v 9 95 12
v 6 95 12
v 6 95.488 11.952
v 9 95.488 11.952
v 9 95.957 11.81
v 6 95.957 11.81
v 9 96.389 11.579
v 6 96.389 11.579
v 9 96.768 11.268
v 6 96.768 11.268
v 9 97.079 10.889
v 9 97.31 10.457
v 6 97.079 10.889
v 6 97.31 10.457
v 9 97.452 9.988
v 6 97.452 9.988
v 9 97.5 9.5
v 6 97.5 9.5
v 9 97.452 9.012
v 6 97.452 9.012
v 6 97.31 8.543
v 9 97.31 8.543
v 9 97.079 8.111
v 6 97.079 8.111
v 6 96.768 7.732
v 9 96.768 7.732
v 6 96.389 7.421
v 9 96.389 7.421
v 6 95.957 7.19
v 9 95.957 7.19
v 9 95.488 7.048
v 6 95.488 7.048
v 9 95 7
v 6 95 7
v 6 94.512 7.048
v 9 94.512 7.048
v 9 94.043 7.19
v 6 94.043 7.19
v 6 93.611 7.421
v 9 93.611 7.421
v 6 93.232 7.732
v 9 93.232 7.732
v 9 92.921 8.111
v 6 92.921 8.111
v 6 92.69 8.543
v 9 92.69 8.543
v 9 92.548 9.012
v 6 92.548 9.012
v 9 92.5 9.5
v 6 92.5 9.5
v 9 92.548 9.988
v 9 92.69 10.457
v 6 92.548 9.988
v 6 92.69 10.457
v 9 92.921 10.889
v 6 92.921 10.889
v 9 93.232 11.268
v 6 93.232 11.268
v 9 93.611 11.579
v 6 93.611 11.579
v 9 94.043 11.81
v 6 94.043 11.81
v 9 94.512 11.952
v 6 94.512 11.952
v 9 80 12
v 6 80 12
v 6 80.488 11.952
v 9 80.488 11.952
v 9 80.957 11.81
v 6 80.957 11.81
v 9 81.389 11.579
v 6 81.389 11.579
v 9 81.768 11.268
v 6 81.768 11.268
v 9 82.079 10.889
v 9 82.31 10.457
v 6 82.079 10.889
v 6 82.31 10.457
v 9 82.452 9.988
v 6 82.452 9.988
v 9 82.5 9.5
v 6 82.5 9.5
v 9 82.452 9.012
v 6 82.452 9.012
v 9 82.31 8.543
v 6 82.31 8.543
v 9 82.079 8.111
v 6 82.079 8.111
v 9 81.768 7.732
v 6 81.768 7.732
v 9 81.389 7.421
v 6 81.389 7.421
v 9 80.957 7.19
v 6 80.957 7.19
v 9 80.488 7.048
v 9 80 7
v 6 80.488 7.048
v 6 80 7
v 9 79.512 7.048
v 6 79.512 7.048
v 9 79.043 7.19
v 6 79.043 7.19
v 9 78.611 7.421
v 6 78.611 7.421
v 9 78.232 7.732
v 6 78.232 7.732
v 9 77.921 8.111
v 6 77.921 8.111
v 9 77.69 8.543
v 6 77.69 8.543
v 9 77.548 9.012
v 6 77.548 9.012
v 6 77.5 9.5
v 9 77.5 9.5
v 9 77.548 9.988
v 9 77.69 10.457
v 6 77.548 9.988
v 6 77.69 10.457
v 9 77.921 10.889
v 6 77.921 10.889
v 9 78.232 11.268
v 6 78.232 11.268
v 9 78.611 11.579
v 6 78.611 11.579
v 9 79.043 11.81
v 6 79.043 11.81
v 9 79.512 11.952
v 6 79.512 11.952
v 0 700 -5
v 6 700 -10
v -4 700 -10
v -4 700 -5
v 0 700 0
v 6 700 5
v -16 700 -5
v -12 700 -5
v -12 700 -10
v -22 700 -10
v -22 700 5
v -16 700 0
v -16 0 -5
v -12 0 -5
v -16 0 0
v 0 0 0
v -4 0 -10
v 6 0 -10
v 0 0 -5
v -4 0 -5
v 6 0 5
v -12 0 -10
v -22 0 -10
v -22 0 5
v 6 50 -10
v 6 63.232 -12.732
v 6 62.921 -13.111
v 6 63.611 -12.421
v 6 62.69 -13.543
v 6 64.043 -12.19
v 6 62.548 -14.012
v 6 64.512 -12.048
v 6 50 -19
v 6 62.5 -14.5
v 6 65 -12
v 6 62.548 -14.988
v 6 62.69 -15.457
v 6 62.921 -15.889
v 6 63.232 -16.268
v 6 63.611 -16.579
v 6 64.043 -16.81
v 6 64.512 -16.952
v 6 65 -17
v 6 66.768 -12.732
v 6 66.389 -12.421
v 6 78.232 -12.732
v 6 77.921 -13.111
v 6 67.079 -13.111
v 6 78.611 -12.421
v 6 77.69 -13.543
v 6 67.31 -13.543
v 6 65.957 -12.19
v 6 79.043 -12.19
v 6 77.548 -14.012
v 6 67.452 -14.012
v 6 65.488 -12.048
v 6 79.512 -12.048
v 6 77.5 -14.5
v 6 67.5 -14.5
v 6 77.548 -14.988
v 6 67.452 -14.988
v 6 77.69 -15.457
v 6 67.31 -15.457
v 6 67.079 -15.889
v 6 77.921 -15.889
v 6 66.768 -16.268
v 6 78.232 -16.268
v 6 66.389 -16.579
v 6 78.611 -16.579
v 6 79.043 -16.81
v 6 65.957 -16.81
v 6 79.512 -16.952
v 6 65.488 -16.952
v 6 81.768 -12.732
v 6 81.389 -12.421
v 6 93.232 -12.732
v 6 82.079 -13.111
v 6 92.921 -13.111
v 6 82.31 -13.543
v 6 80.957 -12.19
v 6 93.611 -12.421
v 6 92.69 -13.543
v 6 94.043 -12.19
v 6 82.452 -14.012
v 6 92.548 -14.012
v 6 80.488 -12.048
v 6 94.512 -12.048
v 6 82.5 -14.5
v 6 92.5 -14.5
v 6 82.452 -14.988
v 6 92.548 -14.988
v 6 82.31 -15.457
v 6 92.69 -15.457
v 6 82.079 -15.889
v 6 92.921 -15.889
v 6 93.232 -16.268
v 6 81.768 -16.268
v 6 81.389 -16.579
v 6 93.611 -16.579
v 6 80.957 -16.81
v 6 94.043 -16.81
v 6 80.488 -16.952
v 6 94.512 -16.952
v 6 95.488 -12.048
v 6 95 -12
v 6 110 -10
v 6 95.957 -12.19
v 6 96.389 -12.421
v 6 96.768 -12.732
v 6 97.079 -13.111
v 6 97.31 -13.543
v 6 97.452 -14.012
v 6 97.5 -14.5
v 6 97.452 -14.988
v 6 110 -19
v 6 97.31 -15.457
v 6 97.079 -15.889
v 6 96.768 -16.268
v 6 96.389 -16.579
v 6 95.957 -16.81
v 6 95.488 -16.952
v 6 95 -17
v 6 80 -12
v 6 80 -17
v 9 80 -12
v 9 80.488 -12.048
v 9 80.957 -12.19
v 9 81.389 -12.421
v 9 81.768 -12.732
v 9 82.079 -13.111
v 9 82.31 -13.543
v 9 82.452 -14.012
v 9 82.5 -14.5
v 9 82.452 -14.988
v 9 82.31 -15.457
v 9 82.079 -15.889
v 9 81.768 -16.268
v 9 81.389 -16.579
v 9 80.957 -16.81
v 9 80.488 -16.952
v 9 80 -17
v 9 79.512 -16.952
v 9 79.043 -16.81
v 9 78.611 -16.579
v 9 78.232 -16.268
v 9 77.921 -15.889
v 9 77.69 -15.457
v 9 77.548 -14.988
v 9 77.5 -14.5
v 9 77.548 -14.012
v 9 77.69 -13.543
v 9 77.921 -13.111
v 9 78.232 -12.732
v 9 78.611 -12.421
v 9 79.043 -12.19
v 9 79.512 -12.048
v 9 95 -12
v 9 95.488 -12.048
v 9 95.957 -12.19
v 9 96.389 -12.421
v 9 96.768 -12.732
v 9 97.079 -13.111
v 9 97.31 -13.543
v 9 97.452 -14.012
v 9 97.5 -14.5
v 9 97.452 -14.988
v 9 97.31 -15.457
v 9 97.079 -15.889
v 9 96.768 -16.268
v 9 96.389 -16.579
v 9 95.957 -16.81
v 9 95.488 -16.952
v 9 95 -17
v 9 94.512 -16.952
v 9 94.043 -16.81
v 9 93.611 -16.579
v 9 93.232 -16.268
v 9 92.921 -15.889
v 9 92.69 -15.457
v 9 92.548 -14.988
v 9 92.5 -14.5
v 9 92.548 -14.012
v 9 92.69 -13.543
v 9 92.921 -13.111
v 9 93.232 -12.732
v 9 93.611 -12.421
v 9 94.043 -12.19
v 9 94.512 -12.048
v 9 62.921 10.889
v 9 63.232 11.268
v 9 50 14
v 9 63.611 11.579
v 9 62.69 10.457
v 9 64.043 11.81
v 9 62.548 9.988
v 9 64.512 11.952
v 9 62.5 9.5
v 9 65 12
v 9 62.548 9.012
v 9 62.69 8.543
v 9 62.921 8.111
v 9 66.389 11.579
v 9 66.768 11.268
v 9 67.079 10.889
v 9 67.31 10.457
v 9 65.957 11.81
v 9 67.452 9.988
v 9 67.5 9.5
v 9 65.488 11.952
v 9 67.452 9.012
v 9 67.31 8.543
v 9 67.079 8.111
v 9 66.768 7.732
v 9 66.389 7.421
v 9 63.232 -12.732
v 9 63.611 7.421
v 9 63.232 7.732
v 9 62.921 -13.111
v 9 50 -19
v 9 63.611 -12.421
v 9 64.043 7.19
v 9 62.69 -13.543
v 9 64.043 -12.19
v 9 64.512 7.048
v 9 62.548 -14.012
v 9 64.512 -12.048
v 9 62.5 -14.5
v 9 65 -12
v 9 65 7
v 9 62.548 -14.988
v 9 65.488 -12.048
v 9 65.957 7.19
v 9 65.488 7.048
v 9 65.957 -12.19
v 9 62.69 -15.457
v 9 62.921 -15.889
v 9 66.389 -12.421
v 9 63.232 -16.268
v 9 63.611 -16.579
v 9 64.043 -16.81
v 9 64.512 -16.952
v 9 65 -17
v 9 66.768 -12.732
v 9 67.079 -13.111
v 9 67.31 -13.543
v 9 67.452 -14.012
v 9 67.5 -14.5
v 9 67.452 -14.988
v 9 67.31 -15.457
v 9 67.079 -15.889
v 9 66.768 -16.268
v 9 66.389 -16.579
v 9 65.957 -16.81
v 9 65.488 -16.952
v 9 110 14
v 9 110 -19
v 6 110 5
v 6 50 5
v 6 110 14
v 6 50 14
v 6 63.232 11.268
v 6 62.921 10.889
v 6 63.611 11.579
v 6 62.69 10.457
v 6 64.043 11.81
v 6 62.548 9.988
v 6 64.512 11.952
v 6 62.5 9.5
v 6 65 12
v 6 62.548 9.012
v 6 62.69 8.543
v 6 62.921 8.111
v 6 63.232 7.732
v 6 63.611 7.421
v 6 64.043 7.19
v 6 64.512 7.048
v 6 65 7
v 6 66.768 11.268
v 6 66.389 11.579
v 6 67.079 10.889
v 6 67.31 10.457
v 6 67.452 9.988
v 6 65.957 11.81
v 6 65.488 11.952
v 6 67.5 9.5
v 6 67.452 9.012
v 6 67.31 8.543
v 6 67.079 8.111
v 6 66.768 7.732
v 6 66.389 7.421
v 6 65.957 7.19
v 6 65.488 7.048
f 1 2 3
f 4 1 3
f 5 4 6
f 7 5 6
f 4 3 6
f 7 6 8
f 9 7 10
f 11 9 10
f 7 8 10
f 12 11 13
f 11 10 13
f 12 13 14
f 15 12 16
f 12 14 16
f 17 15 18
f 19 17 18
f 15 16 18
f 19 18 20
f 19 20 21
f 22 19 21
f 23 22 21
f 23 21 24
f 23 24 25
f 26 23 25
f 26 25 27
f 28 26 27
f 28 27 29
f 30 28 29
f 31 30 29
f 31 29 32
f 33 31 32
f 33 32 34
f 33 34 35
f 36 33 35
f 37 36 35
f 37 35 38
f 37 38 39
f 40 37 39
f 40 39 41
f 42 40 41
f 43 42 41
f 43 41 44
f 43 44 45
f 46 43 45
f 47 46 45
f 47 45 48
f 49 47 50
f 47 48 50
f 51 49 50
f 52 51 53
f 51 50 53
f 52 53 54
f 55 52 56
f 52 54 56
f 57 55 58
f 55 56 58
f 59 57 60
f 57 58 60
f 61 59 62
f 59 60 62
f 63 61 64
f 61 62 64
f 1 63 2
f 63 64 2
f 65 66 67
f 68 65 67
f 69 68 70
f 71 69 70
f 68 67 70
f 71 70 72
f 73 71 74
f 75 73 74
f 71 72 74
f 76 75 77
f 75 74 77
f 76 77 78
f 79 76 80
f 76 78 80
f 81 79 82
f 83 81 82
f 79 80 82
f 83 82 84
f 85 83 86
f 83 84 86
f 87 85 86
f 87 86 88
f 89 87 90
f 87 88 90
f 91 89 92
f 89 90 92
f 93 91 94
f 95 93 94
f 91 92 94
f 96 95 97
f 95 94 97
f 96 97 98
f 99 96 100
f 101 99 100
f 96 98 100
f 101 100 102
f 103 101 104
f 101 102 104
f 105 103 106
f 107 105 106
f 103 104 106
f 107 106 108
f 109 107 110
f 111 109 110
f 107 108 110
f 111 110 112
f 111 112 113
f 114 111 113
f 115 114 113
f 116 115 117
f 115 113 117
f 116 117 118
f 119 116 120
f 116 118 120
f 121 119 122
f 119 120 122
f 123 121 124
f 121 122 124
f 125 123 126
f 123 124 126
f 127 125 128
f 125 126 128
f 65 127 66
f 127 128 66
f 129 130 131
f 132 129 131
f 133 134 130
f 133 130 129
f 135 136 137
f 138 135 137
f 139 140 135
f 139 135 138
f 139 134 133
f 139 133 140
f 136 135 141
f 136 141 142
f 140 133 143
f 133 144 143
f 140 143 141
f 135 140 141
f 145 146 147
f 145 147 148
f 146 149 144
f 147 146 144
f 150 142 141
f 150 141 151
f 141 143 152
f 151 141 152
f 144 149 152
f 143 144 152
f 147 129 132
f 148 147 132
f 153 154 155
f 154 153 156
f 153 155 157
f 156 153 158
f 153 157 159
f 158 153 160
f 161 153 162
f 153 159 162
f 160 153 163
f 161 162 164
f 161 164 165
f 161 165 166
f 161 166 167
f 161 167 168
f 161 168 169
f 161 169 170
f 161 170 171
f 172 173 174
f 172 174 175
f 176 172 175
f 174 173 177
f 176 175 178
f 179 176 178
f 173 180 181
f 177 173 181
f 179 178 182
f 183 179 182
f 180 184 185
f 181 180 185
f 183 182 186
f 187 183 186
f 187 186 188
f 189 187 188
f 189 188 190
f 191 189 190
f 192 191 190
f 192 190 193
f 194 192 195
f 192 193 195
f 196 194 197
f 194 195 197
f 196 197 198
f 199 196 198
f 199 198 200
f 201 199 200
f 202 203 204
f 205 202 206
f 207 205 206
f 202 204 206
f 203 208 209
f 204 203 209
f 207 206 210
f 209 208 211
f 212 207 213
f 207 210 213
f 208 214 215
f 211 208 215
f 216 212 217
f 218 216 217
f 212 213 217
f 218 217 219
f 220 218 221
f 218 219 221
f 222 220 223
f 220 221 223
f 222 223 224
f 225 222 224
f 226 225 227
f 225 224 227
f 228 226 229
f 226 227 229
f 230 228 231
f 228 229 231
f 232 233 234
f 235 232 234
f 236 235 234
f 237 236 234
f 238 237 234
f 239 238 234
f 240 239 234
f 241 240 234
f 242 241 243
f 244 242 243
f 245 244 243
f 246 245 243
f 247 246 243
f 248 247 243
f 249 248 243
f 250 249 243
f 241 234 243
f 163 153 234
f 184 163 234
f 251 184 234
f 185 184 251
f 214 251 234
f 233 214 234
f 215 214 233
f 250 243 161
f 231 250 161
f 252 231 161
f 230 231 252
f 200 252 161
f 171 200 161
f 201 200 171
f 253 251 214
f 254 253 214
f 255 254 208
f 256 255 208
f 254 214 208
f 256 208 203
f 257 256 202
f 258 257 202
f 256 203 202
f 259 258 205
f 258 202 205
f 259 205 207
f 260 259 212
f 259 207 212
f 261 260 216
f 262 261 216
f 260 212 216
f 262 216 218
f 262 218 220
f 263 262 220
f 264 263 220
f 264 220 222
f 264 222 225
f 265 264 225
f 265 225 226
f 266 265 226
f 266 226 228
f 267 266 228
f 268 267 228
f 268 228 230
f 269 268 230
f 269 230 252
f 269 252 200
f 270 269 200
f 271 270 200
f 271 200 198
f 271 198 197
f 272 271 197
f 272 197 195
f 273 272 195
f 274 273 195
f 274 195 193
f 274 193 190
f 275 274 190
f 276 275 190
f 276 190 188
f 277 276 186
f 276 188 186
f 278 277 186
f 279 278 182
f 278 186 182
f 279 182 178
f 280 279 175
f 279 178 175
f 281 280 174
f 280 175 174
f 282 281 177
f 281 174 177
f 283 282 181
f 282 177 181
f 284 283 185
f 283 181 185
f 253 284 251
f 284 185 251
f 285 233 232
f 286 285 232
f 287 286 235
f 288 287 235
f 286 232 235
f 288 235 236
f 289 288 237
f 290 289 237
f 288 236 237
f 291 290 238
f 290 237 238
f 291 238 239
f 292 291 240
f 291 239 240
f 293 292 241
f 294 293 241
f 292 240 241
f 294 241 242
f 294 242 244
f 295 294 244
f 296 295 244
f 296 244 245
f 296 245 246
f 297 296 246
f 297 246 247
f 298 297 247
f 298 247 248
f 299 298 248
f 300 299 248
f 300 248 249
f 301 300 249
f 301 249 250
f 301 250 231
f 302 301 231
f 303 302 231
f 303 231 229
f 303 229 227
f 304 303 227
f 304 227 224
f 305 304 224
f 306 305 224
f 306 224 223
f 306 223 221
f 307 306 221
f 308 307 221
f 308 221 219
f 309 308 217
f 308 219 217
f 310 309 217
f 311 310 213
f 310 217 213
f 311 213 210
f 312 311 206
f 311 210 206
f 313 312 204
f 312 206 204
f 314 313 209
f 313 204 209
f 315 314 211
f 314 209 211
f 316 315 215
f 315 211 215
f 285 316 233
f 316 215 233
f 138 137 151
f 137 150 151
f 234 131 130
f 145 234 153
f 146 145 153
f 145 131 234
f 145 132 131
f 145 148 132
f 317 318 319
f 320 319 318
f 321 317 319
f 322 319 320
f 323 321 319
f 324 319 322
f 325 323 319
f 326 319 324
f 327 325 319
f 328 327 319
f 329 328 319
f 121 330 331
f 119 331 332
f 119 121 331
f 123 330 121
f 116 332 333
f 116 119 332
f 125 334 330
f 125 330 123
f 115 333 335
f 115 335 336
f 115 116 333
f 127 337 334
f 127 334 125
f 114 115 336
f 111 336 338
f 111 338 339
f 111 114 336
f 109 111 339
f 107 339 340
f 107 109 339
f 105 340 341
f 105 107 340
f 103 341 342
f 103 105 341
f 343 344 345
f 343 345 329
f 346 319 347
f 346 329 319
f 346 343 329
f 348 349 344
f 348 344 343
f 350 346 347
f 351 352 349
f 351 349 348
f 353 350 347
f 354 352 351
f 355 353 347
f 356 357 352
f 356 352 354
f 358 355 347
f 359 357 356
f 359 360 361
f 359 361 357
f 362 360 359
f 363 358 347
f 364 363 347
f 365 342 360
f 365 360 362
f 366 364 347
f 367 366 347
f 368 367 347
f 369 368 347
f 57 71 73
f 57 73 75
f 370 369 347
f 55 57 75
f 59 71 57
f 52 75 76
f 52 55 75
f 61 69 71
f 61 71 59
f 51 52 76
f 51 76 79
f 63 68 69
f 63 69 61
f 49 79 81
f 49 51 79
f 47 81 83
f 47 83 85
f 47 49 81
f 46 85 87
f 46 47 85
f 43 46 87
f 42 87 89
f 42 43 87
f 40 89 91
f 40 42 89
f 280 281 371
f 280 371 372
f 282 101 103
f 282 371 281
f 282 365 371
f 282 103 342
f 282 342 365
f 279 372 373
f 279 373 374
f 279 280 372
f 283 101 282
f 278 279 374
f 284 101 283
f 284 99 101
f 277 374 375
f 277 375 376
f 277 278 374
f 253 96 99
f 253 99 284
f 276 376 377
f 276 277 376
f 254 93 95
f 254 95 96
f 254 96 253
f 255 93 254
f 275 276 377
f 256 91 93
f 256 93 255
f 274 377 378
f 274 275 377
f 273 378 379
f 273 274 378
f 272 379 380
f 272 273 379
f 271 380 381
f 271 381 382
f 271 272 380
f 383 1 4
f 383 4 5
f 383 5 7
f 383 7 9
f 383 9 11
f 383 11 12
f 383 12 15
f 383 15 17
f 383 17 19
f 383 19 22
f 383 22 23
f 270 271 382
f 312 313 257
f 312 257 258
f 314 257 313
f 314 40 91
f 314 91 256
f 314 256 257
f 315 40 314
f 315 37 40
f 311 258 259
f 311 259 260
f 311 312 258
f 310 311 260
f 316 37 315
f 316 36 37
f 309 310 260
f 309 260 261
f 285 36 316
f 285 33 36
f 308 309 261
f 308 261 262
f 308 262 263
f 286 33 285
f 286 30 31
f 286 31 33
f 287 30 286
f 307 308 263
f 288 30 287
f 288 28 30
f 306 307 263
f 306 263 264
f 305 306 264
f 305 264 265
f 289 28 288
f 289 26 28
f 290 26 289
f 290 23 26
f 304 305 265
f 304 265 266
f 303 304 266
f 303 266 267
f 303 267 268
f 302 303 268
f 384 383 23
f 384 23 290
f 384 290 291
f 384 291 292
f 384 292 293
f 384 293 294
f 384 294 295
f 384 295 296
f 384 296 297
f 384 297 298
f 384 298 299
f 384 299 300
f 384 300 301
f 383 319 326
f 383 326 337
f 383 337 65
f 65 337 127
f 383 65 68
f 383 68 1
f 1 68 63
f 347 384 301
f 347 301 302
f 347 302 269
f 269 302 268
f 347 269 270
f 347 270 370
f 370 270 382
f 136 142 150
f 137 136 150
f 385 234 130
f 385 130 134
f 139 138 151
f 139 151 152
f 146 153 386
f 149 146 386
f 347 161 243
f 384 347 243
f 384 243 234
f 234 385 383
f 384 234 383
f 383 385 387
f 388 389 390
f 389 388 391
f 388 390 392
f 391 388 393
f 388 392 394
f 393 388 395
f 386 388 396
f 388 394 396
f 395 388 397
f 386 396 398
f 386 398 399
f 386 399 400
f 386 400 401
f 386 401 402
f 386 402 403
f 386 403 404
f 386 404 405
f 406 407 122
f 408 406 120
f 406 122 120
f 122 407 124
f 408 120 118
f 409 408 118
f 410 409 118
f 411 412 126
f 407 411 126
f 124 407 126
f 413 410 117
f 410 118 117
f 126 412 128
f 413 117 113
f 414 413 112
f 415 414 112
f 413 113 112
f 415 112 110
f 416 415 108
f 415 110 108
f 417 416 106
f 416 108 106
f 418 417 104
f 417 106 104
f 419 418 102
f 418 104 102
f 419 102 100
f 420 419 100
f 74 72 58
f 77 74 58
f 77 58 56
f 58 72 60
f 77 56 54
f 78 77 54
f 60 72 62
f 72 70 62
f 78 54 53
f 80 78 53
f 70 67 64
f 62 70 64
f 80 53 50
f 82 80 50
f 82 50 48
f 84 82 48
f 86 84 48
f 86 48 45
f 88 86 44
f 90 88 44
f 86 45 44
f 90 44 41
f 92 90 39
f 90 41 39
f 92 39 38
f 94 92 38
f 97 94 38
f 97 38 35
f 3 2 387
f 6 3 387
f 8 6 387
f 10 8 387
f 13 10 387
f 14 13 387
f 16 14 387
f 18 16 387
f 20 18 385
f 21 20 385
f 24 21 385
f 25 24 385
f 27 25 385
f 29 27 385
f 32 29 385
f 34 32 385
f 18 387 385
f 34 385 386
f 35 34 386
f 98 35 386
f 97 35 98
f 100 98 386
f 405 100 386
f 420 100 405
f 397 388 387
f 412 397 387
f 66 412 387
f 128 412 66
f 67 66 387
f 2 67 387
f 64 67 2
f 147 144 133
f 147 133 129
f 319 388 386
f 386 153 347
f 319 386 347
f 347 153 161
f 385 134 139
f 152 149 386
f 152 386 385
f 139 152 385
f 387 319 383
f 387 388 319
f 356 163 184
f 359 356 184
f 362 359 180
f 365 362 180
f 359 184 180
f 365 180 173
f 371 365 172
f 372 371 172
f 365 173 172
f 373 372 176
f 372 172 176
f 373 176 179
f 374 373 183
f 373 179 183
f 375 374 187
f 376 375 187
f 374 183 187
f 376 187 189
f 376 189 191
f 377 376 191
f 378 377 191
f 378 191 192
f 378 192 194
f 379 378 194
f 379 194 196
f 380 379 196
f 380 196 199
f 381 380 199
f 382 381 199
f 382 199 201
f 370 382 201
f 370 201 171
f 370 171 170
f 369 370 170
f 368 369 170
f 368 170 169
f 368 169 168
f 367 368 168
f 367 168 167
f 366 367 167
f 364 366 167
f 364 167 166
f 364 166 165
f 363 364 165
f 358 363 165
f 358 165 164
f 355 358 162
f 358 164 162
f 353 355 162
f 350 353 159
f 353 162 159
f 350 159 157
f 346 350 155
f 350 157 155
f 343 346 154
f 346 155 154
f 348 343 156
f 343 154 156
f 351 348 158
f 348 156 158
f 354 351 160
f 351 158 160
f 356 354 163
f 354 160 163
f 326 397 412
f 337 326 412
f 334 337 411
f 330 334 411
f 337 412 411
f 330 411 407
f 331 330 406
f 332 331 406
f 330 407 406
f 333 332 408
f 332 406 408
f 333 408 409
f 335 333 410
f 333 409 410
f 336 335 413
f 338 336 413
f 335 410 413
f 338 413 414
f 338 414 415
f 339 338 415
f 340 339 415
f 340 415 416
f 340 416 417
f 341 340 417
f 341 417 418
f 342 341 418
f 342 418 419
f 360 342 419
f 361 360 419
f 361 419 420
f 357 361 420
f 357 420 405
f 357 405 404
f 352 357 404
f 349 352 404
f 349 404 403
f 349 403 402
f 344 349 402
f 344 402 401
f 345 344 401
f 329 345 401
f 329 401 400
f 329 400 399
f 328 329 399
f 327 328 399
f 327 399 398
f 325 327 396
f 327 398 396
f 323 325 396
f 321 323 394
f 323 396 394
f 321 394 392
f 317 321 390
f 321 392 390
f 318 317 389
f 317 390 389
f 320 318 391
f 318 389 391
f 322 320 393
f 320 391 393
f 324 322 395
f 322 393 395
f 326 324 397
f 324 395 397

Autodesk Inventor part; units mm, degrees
ref_plane "YZ Plane" through (0, 0, 0) normal (1, 0, 0) x (0, 1, 0)
ref_plane "XZ Plane" through (0, 0, 0) normal (0, 1, 0) x (-1, 0, 0)
ref_plane "XY Plane" through (0, 0, 0) normal (0, 0, 1) x (1, 0, 0)
sketch "Sketch1" plane through (0, 0, 0) normal (0, 1, 0) x (-1, 0, 0)
  line L0 (0, 0) -> (16, 0)
  line L1 (16, 0) -> (16, -5)
  line L2 (16, -5) -> (12, -5)
  line L3 (12, -5) -> (12, -10)
  line L4 (12, -10) -> (22, -10)
  line L5 (22, -10) -> (22, 5)
  line L6 (22, 5) -> (-4, 5)
  line L7 (0, 0) -> (0, -5)
  line L8 (0, -5) -> (4, -5)
  line L9 (4, -5) -> (4, -10)
  line L10 (4, -10) -> (-6, -10)
  line L11 (-6, -10) -> (-6, 5)
  line L12 (-6, 5) -> (-4, 5)
  dimension "d0" = 16
  dimension "d1" = 5
  dimension "d2" = 4
  dimension "d3" = 5
  dimension "d4" = 10
  dimension "d5" = 15
  dimension "d6" = 26
  dimension "d11" = 5
  dimension "d12" = 4
  dimension "d13" = 5
  dimension "d14" = 10
  dimension "d15" = 15
extrude "Extrusion1" add sketch "Sketch1" along normal blind 500
sketch "Sketch2" plane through (6, 0, 5) normal (1, 0, 0) x (0, 0, -1)
  line L0 (0, 0) -> (0, 500) projected
  line L1 (0, 0) -> (0, 80)
  line L2 (0, 80) -> (15, 80)
  line L3 (15, 0) -> (15, 500) projected
  line L4 (15, 80) -> (35, 80)
  line L5 (35, 80) -> (35, 110)
  line L6 (35, 110) -> (-20, 110)
  line L7 (-20, 110) -> (-20, 50)
  line L8 (-20, 50) -> (35, 50)
  line L9 (35, 50) -> (35, 80)
  line L10 (-20, 110) -> (-10, 110)
  line L11 (-10, 110) -> (-10, 90)
  line L12 (-10, 90) -> (-10, 70)
  line L13 (-10, 70) -> (25, 70)
  line L14 (25, 70) -> (25, 90)
  line L15 (-10, 95) -> (-15.9639, 95)
  line L16 (-10, 65) -> (-17.5959, 65)
  circle A0 centre (25, 95) radius 5
  circle A1 centre (-10, 95) radius 5
  circle A2 centre (25, 65) radius 5
  circle A3 centre (-10, 65) radius 5
  point P0 (5, 0)
  dimension "d18" = 80
  dimension "d19" = 15
  dimension "d20" = 20
  dimension "d21" = 30
  dimension "d22" = 55
  dimension "d23" = 60
  dimension "d24" = 10
  dimension "d25" = 20
  dimension "d26" = 20
  dimension "d27" = 35
  dimension "d28" = 20
  dimension "d33" = 10
  dimension "d34" = 10
  dimension "d35" = 10
  dimension "d36" = 10
extrude "Extrusion2" add sketch "Sketch2" along normal blind 3 contours L8 L7 L6 L11 A1 L12 L13 L0 | L0 L13 L3 L8 | L13 L12 A1 L11 L6 L0 | L0 L2 L3 L13 | L3 L13 L14 L4 L9 L8 | L0 L6 L3 L2 | L3 L4 L14 L13 | L3 L6 L5 L4
sketch "Sketch3" plane through (6, 0, 5) normal (-1, 0, 0) x (0, 0, 1)
  line L0 (20, 50) -> (-35, 50) projected
  line L1 (-35, 50) -> (-35, 110) projected
  line L2 (-35, 50) -> (-35, 110)
  line L3 (-35, 110) -> (20, 110) projected
  line L4 (-35, 110) -> (20, 110)
  line L5 (20, 110) -> (20, 50) projected
  line L6 (20, 110) -> (20, 50)
  line L7 (20, 50) -> (-35, 50)
  point P0 (-5, 0)
extrude "Extrusion3" add sketch "Sketch3" against normal blind 3
sketch "Sketch4" plane through (6, 0, 5) normal (-1, 0, 0) x (0, 0, 1)
  line L0 (0, 50) -> (0, 110) projected
  line L1 (0, 50) -> (9, 50)
  line L2 (20, 50) -> (-35, 50) projected
  line L3 (9, 50) -> (9, 110)
  line L4 (-35, 110) -> (20, 110) projected
  line L5 (9, 110) -> (23.2747, 110)
  line L6 (-35, 110) -> (-15, 110) projected
  line L7 (23.2747, 110) -> (23.2747, 50)
  line L8 (23.2747, 50) -> (9, 50)
  line L9 (-15, 50) -> (-35, 50) projected
  line L10 (-15, 50) -> (-24, 50)
  line L11 (-24, 50) -> (-24, 110)
  line L12 (-24, 110) -> (-51.0156, 108.7427)
  line L13 (-51.0156, 108.7427) -> (-51.1782, 112.2347)
  line L14 (-51.1782, 112.2347) -> (-24, 110)
  line L15 (-51.0156, 108.7427) -> (-55.6093, 34.9275)
  line L16 (-55.6093, 34.9275) -> (-24, 50)
  point P0 (-5, 0)
  dimension "d41" = 9
  dimension "d42" = 9
extrude "Extrusion4" cut sketch "Sketch4" against normal blind 3 contours L3 L4 L5 L7 L8 L2 | L16 L15 L12 L11 | L12 L13 L14
sketch "Sketch5" plane through (6, 0, 5) normal (-1, 0, 0) x (0, 0, 1)
  line L0 (-15, 50) -> (-24, 50) projected
  line L1 (-24, 50) -> (-19.5, 50)
  circle A0 centre (-19.5, 95) radius 2.5
  circle A1 centre (-19.5, 80) radius 2.5
  circle A2 centre (-19.5, 65) radius 2.5
  line L2 (9, 50) -> (0, 50) projected
  line L3 (9, 50) -> (4.5, 50)
  circle A3 centre (4.5, 95) radius 2.5
  circle A4 centre (4.5, 80) radius 2.5
  circle A5 centre (4.5, 65) radius 2.5
  point P0 (-5, 0)
  dimension "d48" = 5
  dimension "d49" = 5
  dimension "d50" = 5
  dimension "d51" = 4.5
  dimension "d52" = 5
  dimension "d53" = 5
  dimension "d54" = 5
extrude "Extrusion5" cut sketch "Sketch5" against normal blind 3
thicken "Thicken1" operation add thickness 200 both sides no extend neighbours yes toward (0, 1, 0) faces at (-5.3333, 500, 3.3333)
properties part number "Guia"
